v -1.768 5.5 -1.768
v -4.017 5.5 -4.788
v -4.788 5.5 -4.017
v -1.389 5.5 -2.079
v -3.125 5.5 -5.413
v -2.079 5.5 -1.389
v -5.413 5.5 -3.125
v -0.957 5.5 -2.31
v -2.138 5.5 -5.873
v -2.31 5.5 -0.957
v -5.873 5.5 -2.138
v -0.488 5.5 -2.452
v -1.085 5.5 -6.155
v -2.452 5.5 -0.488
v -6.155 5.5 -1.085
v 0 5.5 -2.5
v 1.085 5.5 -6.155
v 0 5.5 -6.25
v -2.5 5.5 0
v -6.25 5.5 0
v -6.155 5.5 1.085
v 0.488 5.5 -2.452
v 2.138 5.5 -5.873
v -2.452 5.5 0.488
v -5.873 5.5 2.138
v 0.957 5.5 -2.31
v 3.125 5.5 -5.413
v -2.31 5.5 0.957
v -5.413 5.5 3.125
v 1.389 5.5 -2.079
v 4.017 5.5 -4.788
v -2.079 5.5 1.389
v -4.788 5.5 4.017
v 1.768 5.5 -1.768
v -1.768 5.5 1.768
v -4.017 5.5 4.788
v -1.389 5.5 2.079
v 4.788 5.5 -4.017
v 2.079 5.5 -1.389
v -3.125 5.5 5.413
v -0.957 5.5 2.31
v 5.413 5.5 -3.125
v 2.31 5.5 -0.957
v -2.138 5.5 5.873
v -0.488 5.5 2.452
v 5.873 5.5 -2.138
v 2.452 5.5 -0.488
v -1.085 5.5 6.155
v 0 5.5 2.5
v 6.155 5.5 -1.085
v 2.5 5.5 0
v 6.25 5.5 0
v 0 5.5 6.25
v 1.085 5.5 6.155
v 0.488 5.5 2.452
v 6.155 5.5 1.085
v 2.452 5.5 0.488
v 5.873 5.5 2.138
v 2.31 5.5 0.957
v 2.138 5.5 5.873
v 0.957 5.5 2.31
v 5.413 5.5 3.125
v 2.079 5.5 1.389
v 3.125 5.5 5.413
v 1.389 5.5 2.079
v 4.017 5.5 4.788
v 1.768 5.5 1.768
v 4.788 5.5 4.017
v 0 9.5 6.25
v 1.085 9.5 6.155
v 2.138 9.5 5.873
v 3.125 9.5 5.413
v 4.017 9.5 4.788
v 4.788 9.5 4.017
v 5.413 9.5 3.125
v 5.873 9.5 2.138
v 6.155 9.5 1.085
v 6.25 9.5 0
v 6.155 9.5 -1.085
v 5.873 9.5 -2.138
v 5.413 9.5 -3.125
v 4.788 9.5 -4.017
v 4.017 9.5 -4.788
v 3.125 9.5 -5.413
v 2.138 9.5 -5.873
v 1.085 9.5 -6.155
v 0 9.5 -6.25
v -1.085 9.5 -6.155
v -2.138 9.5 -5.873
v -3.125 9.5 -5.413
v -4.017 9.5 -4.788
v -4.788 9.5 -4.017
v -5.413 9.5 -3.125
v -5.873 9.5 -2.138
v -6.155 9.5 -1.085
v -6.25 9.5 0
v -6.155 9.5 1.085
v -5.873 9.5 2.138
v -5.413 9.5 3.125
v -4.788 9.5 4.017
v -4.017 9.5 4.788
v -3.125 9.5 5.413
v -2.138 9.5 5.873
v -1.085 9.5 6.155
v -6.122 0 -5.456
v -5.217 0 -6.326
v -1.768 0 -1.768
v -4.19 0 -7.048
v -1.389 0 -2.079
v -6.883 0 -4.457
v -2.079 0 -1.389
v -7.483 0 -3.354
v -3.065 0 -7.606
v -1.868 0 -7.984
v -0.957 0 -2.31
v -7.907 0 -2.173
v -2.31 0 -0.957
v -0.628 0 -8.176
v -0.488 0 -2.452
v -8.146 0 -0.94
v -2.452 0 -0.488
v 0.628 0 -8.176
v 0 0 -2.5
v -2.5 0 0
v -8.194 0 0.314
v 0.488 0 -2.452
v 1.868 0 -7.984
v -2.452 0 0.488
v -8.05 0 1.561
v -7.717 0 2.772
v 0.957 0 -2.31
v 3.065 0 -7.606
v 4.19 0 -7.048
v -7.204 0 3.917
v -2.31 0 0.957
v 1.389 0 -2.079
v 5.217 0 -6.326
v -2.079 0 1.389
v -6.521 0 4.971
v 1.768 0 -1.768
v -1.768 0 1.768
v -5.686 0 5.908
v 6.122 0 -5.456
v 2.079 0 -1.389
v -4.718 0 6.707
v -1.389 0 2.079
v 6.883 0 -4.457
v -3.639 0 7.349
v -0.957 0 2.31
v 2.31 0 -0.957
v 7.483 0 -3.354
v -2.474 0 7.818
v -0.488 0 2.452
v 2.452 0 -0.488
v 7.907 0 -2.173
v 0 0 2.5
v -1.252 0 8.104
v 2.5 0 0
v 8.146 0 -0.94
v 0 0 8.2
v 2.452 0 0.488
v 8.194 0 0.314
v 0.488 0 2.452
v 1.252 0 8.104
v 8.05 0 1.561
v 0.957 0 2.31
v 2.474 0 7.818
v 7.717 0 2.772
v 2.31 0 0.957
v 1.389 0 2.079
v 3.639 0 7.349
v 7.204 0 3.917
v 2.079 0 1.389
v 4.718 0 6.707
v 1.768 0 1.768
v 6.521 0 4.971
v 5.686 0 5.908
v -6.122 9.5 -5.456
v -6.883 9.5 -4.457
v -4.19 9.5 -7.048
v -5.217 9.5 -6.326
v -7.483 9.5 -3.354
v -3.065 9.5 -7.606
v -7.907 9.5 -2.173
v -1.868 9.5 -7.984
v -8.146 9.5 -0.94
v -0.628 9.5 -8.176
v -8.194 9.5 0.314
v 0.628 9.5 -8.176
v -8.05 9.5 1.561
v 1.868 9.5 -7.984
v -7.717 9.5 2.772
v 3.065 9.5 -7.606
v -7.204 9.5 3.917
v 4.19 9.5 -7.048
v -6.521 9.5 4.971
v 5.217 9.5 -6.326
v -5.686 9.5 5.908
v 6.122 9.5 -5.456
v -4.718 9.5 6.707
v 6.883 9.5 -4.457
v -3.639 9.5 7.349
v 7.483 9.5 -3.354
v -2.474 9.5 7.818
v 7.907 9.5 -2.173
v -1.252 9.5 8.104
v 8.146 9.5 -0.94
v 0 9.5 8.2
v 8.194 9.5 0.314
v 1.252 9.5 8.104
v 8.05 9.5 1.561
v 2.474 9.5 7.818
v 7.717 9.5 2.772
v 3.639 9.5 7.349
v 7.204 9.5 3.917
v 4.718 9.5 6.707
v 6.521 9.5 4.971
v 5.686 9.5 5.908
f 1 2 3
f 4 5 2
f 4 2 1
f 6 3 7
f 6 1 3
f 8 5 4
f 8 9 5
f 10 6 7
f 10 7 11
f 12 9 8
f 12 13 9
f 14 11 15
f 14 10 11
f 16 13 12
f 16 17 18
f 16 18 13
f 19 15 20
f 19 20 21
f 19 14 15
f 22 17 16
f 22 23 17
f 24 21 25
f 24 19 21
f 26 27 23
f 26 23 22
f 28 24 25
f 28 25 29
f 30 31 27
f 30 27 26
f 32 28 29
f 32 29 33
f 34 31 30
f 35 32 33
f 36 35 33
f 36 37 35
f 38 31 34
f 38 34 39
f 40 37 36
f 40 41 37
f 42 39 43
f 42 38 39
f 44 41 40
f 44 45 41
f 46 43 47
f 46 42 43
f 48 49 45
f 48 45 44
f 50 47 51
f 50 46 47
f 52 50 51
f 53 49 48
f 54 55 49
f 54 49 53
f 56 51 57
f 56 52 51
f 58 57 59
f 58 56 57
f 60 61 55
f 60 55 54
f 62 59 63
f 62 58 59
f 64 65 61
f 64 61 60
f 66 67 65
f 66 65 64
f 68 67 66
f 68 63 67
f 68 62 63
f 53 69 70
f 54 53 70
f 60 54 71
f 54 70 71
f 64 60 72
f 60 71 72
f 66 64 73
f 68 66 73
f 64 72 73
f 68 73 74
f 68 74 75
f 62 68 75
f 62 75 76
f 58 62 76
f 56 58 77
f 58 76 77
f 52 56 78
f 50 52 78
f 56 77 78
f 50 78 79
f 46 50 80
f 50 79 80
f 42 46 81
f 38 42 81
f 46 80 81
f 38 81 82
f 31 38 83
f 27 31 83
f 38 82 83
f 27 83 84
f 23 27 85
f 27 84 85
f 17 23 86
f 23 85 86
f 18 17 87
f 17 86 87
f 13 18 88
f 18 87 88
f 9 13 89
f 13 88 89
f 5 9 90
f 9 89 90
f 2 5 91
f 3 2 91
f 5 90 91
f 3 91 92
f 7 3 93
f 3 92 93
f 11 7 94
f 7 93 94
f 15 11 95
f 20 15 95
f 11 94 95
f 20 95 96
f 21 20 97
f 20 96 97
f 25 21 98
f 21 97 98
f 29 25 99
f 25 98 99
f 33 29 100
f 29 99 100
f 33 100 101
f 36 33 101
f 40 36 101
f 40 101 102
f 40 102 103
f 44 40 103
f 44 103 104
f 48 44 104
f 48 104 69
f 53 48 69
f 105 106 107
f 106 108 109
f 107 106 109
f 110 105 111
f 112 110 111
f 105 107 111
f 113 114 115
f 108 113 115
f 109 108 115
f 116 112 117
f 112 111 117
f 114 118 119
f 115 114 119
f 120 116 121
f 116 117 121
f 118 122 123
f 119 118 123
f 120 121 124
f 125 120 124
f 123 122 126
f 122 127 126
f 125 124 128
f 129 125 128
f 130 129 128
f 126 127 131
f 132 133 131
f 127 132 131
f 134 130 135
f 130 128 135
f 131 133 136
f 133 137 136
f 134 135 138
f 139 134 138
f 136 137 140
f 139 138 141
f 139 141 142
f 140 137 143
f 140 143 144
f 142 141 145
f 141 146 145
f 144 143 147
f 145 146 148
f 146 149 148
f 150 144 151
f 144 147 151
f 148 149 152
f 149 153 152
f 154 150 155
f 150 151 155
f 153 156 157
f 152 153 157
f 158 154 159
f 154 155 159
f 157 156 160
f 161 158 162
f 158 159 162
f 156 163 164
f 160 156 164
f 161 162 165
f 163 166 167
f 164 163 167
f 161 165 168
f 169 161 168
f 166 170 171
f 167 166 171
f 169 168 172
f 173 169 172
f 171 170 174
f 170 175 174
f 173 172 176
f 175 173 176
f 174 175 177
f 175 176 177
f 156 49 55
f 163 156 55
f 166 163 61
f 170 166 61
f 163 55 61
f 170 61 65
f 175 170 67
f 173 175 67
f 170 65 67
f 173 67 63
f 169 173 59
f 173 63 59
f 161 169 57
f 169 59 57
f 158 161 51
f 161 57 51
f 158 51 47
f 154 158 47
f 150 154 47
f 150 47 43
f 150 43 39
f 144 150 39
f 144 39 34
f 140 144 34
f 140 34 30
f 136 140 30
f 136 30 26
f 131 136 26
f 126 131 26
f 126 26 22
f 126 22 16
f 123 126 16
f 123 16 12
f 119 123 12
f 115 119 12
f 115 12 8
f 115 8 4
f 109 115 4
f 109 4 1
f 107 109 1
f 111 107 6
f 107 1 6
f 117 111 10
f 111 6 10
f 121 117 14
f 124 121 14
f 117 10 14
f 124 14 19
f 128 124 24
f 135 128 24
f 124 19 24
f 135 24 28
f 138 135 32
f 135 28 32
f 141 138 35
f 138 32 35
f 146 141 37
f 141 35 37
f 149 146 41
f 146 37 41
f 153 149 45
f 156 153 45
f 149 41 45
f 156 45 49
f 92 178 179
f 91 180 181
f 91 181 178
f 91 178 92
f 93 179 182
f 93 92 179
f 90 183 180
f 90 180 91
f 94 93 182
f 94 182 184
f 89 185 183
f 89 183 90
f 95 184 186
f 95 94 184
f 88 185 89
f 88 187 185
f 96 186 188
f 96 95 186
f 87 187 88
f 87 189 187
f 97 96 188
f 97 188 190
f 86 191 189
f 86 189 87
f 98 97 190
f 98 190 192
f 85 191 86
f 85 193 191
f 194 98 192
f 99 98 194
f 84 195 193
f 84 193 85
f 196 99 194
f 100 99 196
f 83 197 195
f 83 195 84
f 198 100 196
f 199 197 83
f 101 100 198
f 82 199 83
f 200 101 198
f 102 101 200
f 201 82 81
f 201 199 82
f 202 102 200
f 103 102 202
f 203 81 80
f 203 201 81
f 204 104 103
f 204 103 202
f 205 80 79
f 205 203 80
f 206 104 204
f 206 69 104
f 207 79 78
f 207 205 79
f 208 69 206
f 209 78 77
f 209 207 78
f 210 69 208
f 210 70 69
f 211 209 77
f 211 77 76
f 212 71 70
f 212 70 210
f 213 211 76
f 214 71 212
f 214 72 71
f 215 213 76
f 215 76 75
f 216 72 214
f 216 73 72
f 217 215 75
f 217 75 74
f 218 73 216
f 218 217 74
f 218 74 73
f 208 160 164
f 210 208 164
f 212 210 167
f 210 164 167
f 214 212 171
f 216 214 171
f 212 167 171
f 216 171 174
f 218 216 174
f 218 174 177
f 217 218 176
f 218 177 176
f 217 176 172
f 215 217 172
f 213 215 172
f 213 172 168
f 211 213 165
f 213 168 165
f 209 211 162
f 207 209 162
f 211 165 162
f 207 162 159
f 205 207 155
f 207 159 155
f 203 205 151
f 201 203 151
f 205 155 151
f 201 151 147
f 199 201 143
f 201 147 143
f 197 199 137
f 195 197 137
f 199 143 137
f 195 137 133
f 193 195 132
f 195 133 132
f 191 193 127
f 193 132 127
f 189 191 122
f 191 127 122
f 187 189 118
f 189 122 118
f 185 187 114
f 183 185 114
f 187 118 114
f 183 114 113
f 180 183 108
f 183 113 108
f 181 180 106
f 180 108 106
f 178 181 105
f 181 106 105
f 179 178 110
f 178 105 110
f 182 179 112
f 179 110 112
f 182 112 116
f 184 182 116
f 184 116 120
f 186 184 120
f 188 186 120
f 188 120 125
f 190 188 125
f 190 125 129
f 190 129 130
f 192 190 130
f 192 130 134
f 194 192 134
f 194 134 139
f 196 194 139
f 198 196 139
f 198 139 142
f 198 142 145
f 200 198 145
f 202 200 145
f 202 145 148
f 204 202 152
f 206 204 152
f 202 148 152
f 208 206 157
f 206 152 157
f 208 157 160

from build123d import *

# Parameters (mm, degrees)
SKETCH1_R           = 8.2
BOSS_EXTRUDE1_DEPTH = 9.5
SKETCH2_R           = 6.25
CUT_EXTRUDE1_DEPTH  = 4
SKETCH3_R           = 2.5
CUT_EXTRUDE2_DEPTH  = 13.83471854


with BuildPart() as part:
    # Sketch1 → Boss-Extrude1 (new body)
    with BuildSketch(Plane(origin=(0, 0, 0), x_dir=(1, 0, 0), z_dir=(0, 1, 0))):
        with Locations(Location((0, 0, 0), (0, 0, 270))):
            Circle(SKETCH1_R)
    extrude(amount=BOSS_EXTRUDE1_DEPTH)

    # Sketch2 → Cut-Extrude1 (cut)
    with BuildSketch(Plane(origin=(0, 9.5, 0), x_dir=(1, 0, 0), z_dir=(0, 1, 0))):
        with Locations(Location((0, 0, 0), (0, 0, 270))):
            Circle(SKETCH2_R)
    extrude(amount=-CUT_EXTRUDE1_DEPTH, mode=Mode.SUBTRACT)

    # Sketch3 → Cut-Extrude2 (cut, through all)
    with BuildSketch(Plane(origin=(0, 5.5, 0), x_dir=(1, 0, 0), z_dir=(0, 1, 0))):
        with Locations(Location((0, 0, 0), (0, 0, 270))):
            Circle(SKETCH3_R)
    extrude(amount=-CUT_EXTRUDE2_DEPTH, mode=Mode.SUBTRACT)


solid = part.part
